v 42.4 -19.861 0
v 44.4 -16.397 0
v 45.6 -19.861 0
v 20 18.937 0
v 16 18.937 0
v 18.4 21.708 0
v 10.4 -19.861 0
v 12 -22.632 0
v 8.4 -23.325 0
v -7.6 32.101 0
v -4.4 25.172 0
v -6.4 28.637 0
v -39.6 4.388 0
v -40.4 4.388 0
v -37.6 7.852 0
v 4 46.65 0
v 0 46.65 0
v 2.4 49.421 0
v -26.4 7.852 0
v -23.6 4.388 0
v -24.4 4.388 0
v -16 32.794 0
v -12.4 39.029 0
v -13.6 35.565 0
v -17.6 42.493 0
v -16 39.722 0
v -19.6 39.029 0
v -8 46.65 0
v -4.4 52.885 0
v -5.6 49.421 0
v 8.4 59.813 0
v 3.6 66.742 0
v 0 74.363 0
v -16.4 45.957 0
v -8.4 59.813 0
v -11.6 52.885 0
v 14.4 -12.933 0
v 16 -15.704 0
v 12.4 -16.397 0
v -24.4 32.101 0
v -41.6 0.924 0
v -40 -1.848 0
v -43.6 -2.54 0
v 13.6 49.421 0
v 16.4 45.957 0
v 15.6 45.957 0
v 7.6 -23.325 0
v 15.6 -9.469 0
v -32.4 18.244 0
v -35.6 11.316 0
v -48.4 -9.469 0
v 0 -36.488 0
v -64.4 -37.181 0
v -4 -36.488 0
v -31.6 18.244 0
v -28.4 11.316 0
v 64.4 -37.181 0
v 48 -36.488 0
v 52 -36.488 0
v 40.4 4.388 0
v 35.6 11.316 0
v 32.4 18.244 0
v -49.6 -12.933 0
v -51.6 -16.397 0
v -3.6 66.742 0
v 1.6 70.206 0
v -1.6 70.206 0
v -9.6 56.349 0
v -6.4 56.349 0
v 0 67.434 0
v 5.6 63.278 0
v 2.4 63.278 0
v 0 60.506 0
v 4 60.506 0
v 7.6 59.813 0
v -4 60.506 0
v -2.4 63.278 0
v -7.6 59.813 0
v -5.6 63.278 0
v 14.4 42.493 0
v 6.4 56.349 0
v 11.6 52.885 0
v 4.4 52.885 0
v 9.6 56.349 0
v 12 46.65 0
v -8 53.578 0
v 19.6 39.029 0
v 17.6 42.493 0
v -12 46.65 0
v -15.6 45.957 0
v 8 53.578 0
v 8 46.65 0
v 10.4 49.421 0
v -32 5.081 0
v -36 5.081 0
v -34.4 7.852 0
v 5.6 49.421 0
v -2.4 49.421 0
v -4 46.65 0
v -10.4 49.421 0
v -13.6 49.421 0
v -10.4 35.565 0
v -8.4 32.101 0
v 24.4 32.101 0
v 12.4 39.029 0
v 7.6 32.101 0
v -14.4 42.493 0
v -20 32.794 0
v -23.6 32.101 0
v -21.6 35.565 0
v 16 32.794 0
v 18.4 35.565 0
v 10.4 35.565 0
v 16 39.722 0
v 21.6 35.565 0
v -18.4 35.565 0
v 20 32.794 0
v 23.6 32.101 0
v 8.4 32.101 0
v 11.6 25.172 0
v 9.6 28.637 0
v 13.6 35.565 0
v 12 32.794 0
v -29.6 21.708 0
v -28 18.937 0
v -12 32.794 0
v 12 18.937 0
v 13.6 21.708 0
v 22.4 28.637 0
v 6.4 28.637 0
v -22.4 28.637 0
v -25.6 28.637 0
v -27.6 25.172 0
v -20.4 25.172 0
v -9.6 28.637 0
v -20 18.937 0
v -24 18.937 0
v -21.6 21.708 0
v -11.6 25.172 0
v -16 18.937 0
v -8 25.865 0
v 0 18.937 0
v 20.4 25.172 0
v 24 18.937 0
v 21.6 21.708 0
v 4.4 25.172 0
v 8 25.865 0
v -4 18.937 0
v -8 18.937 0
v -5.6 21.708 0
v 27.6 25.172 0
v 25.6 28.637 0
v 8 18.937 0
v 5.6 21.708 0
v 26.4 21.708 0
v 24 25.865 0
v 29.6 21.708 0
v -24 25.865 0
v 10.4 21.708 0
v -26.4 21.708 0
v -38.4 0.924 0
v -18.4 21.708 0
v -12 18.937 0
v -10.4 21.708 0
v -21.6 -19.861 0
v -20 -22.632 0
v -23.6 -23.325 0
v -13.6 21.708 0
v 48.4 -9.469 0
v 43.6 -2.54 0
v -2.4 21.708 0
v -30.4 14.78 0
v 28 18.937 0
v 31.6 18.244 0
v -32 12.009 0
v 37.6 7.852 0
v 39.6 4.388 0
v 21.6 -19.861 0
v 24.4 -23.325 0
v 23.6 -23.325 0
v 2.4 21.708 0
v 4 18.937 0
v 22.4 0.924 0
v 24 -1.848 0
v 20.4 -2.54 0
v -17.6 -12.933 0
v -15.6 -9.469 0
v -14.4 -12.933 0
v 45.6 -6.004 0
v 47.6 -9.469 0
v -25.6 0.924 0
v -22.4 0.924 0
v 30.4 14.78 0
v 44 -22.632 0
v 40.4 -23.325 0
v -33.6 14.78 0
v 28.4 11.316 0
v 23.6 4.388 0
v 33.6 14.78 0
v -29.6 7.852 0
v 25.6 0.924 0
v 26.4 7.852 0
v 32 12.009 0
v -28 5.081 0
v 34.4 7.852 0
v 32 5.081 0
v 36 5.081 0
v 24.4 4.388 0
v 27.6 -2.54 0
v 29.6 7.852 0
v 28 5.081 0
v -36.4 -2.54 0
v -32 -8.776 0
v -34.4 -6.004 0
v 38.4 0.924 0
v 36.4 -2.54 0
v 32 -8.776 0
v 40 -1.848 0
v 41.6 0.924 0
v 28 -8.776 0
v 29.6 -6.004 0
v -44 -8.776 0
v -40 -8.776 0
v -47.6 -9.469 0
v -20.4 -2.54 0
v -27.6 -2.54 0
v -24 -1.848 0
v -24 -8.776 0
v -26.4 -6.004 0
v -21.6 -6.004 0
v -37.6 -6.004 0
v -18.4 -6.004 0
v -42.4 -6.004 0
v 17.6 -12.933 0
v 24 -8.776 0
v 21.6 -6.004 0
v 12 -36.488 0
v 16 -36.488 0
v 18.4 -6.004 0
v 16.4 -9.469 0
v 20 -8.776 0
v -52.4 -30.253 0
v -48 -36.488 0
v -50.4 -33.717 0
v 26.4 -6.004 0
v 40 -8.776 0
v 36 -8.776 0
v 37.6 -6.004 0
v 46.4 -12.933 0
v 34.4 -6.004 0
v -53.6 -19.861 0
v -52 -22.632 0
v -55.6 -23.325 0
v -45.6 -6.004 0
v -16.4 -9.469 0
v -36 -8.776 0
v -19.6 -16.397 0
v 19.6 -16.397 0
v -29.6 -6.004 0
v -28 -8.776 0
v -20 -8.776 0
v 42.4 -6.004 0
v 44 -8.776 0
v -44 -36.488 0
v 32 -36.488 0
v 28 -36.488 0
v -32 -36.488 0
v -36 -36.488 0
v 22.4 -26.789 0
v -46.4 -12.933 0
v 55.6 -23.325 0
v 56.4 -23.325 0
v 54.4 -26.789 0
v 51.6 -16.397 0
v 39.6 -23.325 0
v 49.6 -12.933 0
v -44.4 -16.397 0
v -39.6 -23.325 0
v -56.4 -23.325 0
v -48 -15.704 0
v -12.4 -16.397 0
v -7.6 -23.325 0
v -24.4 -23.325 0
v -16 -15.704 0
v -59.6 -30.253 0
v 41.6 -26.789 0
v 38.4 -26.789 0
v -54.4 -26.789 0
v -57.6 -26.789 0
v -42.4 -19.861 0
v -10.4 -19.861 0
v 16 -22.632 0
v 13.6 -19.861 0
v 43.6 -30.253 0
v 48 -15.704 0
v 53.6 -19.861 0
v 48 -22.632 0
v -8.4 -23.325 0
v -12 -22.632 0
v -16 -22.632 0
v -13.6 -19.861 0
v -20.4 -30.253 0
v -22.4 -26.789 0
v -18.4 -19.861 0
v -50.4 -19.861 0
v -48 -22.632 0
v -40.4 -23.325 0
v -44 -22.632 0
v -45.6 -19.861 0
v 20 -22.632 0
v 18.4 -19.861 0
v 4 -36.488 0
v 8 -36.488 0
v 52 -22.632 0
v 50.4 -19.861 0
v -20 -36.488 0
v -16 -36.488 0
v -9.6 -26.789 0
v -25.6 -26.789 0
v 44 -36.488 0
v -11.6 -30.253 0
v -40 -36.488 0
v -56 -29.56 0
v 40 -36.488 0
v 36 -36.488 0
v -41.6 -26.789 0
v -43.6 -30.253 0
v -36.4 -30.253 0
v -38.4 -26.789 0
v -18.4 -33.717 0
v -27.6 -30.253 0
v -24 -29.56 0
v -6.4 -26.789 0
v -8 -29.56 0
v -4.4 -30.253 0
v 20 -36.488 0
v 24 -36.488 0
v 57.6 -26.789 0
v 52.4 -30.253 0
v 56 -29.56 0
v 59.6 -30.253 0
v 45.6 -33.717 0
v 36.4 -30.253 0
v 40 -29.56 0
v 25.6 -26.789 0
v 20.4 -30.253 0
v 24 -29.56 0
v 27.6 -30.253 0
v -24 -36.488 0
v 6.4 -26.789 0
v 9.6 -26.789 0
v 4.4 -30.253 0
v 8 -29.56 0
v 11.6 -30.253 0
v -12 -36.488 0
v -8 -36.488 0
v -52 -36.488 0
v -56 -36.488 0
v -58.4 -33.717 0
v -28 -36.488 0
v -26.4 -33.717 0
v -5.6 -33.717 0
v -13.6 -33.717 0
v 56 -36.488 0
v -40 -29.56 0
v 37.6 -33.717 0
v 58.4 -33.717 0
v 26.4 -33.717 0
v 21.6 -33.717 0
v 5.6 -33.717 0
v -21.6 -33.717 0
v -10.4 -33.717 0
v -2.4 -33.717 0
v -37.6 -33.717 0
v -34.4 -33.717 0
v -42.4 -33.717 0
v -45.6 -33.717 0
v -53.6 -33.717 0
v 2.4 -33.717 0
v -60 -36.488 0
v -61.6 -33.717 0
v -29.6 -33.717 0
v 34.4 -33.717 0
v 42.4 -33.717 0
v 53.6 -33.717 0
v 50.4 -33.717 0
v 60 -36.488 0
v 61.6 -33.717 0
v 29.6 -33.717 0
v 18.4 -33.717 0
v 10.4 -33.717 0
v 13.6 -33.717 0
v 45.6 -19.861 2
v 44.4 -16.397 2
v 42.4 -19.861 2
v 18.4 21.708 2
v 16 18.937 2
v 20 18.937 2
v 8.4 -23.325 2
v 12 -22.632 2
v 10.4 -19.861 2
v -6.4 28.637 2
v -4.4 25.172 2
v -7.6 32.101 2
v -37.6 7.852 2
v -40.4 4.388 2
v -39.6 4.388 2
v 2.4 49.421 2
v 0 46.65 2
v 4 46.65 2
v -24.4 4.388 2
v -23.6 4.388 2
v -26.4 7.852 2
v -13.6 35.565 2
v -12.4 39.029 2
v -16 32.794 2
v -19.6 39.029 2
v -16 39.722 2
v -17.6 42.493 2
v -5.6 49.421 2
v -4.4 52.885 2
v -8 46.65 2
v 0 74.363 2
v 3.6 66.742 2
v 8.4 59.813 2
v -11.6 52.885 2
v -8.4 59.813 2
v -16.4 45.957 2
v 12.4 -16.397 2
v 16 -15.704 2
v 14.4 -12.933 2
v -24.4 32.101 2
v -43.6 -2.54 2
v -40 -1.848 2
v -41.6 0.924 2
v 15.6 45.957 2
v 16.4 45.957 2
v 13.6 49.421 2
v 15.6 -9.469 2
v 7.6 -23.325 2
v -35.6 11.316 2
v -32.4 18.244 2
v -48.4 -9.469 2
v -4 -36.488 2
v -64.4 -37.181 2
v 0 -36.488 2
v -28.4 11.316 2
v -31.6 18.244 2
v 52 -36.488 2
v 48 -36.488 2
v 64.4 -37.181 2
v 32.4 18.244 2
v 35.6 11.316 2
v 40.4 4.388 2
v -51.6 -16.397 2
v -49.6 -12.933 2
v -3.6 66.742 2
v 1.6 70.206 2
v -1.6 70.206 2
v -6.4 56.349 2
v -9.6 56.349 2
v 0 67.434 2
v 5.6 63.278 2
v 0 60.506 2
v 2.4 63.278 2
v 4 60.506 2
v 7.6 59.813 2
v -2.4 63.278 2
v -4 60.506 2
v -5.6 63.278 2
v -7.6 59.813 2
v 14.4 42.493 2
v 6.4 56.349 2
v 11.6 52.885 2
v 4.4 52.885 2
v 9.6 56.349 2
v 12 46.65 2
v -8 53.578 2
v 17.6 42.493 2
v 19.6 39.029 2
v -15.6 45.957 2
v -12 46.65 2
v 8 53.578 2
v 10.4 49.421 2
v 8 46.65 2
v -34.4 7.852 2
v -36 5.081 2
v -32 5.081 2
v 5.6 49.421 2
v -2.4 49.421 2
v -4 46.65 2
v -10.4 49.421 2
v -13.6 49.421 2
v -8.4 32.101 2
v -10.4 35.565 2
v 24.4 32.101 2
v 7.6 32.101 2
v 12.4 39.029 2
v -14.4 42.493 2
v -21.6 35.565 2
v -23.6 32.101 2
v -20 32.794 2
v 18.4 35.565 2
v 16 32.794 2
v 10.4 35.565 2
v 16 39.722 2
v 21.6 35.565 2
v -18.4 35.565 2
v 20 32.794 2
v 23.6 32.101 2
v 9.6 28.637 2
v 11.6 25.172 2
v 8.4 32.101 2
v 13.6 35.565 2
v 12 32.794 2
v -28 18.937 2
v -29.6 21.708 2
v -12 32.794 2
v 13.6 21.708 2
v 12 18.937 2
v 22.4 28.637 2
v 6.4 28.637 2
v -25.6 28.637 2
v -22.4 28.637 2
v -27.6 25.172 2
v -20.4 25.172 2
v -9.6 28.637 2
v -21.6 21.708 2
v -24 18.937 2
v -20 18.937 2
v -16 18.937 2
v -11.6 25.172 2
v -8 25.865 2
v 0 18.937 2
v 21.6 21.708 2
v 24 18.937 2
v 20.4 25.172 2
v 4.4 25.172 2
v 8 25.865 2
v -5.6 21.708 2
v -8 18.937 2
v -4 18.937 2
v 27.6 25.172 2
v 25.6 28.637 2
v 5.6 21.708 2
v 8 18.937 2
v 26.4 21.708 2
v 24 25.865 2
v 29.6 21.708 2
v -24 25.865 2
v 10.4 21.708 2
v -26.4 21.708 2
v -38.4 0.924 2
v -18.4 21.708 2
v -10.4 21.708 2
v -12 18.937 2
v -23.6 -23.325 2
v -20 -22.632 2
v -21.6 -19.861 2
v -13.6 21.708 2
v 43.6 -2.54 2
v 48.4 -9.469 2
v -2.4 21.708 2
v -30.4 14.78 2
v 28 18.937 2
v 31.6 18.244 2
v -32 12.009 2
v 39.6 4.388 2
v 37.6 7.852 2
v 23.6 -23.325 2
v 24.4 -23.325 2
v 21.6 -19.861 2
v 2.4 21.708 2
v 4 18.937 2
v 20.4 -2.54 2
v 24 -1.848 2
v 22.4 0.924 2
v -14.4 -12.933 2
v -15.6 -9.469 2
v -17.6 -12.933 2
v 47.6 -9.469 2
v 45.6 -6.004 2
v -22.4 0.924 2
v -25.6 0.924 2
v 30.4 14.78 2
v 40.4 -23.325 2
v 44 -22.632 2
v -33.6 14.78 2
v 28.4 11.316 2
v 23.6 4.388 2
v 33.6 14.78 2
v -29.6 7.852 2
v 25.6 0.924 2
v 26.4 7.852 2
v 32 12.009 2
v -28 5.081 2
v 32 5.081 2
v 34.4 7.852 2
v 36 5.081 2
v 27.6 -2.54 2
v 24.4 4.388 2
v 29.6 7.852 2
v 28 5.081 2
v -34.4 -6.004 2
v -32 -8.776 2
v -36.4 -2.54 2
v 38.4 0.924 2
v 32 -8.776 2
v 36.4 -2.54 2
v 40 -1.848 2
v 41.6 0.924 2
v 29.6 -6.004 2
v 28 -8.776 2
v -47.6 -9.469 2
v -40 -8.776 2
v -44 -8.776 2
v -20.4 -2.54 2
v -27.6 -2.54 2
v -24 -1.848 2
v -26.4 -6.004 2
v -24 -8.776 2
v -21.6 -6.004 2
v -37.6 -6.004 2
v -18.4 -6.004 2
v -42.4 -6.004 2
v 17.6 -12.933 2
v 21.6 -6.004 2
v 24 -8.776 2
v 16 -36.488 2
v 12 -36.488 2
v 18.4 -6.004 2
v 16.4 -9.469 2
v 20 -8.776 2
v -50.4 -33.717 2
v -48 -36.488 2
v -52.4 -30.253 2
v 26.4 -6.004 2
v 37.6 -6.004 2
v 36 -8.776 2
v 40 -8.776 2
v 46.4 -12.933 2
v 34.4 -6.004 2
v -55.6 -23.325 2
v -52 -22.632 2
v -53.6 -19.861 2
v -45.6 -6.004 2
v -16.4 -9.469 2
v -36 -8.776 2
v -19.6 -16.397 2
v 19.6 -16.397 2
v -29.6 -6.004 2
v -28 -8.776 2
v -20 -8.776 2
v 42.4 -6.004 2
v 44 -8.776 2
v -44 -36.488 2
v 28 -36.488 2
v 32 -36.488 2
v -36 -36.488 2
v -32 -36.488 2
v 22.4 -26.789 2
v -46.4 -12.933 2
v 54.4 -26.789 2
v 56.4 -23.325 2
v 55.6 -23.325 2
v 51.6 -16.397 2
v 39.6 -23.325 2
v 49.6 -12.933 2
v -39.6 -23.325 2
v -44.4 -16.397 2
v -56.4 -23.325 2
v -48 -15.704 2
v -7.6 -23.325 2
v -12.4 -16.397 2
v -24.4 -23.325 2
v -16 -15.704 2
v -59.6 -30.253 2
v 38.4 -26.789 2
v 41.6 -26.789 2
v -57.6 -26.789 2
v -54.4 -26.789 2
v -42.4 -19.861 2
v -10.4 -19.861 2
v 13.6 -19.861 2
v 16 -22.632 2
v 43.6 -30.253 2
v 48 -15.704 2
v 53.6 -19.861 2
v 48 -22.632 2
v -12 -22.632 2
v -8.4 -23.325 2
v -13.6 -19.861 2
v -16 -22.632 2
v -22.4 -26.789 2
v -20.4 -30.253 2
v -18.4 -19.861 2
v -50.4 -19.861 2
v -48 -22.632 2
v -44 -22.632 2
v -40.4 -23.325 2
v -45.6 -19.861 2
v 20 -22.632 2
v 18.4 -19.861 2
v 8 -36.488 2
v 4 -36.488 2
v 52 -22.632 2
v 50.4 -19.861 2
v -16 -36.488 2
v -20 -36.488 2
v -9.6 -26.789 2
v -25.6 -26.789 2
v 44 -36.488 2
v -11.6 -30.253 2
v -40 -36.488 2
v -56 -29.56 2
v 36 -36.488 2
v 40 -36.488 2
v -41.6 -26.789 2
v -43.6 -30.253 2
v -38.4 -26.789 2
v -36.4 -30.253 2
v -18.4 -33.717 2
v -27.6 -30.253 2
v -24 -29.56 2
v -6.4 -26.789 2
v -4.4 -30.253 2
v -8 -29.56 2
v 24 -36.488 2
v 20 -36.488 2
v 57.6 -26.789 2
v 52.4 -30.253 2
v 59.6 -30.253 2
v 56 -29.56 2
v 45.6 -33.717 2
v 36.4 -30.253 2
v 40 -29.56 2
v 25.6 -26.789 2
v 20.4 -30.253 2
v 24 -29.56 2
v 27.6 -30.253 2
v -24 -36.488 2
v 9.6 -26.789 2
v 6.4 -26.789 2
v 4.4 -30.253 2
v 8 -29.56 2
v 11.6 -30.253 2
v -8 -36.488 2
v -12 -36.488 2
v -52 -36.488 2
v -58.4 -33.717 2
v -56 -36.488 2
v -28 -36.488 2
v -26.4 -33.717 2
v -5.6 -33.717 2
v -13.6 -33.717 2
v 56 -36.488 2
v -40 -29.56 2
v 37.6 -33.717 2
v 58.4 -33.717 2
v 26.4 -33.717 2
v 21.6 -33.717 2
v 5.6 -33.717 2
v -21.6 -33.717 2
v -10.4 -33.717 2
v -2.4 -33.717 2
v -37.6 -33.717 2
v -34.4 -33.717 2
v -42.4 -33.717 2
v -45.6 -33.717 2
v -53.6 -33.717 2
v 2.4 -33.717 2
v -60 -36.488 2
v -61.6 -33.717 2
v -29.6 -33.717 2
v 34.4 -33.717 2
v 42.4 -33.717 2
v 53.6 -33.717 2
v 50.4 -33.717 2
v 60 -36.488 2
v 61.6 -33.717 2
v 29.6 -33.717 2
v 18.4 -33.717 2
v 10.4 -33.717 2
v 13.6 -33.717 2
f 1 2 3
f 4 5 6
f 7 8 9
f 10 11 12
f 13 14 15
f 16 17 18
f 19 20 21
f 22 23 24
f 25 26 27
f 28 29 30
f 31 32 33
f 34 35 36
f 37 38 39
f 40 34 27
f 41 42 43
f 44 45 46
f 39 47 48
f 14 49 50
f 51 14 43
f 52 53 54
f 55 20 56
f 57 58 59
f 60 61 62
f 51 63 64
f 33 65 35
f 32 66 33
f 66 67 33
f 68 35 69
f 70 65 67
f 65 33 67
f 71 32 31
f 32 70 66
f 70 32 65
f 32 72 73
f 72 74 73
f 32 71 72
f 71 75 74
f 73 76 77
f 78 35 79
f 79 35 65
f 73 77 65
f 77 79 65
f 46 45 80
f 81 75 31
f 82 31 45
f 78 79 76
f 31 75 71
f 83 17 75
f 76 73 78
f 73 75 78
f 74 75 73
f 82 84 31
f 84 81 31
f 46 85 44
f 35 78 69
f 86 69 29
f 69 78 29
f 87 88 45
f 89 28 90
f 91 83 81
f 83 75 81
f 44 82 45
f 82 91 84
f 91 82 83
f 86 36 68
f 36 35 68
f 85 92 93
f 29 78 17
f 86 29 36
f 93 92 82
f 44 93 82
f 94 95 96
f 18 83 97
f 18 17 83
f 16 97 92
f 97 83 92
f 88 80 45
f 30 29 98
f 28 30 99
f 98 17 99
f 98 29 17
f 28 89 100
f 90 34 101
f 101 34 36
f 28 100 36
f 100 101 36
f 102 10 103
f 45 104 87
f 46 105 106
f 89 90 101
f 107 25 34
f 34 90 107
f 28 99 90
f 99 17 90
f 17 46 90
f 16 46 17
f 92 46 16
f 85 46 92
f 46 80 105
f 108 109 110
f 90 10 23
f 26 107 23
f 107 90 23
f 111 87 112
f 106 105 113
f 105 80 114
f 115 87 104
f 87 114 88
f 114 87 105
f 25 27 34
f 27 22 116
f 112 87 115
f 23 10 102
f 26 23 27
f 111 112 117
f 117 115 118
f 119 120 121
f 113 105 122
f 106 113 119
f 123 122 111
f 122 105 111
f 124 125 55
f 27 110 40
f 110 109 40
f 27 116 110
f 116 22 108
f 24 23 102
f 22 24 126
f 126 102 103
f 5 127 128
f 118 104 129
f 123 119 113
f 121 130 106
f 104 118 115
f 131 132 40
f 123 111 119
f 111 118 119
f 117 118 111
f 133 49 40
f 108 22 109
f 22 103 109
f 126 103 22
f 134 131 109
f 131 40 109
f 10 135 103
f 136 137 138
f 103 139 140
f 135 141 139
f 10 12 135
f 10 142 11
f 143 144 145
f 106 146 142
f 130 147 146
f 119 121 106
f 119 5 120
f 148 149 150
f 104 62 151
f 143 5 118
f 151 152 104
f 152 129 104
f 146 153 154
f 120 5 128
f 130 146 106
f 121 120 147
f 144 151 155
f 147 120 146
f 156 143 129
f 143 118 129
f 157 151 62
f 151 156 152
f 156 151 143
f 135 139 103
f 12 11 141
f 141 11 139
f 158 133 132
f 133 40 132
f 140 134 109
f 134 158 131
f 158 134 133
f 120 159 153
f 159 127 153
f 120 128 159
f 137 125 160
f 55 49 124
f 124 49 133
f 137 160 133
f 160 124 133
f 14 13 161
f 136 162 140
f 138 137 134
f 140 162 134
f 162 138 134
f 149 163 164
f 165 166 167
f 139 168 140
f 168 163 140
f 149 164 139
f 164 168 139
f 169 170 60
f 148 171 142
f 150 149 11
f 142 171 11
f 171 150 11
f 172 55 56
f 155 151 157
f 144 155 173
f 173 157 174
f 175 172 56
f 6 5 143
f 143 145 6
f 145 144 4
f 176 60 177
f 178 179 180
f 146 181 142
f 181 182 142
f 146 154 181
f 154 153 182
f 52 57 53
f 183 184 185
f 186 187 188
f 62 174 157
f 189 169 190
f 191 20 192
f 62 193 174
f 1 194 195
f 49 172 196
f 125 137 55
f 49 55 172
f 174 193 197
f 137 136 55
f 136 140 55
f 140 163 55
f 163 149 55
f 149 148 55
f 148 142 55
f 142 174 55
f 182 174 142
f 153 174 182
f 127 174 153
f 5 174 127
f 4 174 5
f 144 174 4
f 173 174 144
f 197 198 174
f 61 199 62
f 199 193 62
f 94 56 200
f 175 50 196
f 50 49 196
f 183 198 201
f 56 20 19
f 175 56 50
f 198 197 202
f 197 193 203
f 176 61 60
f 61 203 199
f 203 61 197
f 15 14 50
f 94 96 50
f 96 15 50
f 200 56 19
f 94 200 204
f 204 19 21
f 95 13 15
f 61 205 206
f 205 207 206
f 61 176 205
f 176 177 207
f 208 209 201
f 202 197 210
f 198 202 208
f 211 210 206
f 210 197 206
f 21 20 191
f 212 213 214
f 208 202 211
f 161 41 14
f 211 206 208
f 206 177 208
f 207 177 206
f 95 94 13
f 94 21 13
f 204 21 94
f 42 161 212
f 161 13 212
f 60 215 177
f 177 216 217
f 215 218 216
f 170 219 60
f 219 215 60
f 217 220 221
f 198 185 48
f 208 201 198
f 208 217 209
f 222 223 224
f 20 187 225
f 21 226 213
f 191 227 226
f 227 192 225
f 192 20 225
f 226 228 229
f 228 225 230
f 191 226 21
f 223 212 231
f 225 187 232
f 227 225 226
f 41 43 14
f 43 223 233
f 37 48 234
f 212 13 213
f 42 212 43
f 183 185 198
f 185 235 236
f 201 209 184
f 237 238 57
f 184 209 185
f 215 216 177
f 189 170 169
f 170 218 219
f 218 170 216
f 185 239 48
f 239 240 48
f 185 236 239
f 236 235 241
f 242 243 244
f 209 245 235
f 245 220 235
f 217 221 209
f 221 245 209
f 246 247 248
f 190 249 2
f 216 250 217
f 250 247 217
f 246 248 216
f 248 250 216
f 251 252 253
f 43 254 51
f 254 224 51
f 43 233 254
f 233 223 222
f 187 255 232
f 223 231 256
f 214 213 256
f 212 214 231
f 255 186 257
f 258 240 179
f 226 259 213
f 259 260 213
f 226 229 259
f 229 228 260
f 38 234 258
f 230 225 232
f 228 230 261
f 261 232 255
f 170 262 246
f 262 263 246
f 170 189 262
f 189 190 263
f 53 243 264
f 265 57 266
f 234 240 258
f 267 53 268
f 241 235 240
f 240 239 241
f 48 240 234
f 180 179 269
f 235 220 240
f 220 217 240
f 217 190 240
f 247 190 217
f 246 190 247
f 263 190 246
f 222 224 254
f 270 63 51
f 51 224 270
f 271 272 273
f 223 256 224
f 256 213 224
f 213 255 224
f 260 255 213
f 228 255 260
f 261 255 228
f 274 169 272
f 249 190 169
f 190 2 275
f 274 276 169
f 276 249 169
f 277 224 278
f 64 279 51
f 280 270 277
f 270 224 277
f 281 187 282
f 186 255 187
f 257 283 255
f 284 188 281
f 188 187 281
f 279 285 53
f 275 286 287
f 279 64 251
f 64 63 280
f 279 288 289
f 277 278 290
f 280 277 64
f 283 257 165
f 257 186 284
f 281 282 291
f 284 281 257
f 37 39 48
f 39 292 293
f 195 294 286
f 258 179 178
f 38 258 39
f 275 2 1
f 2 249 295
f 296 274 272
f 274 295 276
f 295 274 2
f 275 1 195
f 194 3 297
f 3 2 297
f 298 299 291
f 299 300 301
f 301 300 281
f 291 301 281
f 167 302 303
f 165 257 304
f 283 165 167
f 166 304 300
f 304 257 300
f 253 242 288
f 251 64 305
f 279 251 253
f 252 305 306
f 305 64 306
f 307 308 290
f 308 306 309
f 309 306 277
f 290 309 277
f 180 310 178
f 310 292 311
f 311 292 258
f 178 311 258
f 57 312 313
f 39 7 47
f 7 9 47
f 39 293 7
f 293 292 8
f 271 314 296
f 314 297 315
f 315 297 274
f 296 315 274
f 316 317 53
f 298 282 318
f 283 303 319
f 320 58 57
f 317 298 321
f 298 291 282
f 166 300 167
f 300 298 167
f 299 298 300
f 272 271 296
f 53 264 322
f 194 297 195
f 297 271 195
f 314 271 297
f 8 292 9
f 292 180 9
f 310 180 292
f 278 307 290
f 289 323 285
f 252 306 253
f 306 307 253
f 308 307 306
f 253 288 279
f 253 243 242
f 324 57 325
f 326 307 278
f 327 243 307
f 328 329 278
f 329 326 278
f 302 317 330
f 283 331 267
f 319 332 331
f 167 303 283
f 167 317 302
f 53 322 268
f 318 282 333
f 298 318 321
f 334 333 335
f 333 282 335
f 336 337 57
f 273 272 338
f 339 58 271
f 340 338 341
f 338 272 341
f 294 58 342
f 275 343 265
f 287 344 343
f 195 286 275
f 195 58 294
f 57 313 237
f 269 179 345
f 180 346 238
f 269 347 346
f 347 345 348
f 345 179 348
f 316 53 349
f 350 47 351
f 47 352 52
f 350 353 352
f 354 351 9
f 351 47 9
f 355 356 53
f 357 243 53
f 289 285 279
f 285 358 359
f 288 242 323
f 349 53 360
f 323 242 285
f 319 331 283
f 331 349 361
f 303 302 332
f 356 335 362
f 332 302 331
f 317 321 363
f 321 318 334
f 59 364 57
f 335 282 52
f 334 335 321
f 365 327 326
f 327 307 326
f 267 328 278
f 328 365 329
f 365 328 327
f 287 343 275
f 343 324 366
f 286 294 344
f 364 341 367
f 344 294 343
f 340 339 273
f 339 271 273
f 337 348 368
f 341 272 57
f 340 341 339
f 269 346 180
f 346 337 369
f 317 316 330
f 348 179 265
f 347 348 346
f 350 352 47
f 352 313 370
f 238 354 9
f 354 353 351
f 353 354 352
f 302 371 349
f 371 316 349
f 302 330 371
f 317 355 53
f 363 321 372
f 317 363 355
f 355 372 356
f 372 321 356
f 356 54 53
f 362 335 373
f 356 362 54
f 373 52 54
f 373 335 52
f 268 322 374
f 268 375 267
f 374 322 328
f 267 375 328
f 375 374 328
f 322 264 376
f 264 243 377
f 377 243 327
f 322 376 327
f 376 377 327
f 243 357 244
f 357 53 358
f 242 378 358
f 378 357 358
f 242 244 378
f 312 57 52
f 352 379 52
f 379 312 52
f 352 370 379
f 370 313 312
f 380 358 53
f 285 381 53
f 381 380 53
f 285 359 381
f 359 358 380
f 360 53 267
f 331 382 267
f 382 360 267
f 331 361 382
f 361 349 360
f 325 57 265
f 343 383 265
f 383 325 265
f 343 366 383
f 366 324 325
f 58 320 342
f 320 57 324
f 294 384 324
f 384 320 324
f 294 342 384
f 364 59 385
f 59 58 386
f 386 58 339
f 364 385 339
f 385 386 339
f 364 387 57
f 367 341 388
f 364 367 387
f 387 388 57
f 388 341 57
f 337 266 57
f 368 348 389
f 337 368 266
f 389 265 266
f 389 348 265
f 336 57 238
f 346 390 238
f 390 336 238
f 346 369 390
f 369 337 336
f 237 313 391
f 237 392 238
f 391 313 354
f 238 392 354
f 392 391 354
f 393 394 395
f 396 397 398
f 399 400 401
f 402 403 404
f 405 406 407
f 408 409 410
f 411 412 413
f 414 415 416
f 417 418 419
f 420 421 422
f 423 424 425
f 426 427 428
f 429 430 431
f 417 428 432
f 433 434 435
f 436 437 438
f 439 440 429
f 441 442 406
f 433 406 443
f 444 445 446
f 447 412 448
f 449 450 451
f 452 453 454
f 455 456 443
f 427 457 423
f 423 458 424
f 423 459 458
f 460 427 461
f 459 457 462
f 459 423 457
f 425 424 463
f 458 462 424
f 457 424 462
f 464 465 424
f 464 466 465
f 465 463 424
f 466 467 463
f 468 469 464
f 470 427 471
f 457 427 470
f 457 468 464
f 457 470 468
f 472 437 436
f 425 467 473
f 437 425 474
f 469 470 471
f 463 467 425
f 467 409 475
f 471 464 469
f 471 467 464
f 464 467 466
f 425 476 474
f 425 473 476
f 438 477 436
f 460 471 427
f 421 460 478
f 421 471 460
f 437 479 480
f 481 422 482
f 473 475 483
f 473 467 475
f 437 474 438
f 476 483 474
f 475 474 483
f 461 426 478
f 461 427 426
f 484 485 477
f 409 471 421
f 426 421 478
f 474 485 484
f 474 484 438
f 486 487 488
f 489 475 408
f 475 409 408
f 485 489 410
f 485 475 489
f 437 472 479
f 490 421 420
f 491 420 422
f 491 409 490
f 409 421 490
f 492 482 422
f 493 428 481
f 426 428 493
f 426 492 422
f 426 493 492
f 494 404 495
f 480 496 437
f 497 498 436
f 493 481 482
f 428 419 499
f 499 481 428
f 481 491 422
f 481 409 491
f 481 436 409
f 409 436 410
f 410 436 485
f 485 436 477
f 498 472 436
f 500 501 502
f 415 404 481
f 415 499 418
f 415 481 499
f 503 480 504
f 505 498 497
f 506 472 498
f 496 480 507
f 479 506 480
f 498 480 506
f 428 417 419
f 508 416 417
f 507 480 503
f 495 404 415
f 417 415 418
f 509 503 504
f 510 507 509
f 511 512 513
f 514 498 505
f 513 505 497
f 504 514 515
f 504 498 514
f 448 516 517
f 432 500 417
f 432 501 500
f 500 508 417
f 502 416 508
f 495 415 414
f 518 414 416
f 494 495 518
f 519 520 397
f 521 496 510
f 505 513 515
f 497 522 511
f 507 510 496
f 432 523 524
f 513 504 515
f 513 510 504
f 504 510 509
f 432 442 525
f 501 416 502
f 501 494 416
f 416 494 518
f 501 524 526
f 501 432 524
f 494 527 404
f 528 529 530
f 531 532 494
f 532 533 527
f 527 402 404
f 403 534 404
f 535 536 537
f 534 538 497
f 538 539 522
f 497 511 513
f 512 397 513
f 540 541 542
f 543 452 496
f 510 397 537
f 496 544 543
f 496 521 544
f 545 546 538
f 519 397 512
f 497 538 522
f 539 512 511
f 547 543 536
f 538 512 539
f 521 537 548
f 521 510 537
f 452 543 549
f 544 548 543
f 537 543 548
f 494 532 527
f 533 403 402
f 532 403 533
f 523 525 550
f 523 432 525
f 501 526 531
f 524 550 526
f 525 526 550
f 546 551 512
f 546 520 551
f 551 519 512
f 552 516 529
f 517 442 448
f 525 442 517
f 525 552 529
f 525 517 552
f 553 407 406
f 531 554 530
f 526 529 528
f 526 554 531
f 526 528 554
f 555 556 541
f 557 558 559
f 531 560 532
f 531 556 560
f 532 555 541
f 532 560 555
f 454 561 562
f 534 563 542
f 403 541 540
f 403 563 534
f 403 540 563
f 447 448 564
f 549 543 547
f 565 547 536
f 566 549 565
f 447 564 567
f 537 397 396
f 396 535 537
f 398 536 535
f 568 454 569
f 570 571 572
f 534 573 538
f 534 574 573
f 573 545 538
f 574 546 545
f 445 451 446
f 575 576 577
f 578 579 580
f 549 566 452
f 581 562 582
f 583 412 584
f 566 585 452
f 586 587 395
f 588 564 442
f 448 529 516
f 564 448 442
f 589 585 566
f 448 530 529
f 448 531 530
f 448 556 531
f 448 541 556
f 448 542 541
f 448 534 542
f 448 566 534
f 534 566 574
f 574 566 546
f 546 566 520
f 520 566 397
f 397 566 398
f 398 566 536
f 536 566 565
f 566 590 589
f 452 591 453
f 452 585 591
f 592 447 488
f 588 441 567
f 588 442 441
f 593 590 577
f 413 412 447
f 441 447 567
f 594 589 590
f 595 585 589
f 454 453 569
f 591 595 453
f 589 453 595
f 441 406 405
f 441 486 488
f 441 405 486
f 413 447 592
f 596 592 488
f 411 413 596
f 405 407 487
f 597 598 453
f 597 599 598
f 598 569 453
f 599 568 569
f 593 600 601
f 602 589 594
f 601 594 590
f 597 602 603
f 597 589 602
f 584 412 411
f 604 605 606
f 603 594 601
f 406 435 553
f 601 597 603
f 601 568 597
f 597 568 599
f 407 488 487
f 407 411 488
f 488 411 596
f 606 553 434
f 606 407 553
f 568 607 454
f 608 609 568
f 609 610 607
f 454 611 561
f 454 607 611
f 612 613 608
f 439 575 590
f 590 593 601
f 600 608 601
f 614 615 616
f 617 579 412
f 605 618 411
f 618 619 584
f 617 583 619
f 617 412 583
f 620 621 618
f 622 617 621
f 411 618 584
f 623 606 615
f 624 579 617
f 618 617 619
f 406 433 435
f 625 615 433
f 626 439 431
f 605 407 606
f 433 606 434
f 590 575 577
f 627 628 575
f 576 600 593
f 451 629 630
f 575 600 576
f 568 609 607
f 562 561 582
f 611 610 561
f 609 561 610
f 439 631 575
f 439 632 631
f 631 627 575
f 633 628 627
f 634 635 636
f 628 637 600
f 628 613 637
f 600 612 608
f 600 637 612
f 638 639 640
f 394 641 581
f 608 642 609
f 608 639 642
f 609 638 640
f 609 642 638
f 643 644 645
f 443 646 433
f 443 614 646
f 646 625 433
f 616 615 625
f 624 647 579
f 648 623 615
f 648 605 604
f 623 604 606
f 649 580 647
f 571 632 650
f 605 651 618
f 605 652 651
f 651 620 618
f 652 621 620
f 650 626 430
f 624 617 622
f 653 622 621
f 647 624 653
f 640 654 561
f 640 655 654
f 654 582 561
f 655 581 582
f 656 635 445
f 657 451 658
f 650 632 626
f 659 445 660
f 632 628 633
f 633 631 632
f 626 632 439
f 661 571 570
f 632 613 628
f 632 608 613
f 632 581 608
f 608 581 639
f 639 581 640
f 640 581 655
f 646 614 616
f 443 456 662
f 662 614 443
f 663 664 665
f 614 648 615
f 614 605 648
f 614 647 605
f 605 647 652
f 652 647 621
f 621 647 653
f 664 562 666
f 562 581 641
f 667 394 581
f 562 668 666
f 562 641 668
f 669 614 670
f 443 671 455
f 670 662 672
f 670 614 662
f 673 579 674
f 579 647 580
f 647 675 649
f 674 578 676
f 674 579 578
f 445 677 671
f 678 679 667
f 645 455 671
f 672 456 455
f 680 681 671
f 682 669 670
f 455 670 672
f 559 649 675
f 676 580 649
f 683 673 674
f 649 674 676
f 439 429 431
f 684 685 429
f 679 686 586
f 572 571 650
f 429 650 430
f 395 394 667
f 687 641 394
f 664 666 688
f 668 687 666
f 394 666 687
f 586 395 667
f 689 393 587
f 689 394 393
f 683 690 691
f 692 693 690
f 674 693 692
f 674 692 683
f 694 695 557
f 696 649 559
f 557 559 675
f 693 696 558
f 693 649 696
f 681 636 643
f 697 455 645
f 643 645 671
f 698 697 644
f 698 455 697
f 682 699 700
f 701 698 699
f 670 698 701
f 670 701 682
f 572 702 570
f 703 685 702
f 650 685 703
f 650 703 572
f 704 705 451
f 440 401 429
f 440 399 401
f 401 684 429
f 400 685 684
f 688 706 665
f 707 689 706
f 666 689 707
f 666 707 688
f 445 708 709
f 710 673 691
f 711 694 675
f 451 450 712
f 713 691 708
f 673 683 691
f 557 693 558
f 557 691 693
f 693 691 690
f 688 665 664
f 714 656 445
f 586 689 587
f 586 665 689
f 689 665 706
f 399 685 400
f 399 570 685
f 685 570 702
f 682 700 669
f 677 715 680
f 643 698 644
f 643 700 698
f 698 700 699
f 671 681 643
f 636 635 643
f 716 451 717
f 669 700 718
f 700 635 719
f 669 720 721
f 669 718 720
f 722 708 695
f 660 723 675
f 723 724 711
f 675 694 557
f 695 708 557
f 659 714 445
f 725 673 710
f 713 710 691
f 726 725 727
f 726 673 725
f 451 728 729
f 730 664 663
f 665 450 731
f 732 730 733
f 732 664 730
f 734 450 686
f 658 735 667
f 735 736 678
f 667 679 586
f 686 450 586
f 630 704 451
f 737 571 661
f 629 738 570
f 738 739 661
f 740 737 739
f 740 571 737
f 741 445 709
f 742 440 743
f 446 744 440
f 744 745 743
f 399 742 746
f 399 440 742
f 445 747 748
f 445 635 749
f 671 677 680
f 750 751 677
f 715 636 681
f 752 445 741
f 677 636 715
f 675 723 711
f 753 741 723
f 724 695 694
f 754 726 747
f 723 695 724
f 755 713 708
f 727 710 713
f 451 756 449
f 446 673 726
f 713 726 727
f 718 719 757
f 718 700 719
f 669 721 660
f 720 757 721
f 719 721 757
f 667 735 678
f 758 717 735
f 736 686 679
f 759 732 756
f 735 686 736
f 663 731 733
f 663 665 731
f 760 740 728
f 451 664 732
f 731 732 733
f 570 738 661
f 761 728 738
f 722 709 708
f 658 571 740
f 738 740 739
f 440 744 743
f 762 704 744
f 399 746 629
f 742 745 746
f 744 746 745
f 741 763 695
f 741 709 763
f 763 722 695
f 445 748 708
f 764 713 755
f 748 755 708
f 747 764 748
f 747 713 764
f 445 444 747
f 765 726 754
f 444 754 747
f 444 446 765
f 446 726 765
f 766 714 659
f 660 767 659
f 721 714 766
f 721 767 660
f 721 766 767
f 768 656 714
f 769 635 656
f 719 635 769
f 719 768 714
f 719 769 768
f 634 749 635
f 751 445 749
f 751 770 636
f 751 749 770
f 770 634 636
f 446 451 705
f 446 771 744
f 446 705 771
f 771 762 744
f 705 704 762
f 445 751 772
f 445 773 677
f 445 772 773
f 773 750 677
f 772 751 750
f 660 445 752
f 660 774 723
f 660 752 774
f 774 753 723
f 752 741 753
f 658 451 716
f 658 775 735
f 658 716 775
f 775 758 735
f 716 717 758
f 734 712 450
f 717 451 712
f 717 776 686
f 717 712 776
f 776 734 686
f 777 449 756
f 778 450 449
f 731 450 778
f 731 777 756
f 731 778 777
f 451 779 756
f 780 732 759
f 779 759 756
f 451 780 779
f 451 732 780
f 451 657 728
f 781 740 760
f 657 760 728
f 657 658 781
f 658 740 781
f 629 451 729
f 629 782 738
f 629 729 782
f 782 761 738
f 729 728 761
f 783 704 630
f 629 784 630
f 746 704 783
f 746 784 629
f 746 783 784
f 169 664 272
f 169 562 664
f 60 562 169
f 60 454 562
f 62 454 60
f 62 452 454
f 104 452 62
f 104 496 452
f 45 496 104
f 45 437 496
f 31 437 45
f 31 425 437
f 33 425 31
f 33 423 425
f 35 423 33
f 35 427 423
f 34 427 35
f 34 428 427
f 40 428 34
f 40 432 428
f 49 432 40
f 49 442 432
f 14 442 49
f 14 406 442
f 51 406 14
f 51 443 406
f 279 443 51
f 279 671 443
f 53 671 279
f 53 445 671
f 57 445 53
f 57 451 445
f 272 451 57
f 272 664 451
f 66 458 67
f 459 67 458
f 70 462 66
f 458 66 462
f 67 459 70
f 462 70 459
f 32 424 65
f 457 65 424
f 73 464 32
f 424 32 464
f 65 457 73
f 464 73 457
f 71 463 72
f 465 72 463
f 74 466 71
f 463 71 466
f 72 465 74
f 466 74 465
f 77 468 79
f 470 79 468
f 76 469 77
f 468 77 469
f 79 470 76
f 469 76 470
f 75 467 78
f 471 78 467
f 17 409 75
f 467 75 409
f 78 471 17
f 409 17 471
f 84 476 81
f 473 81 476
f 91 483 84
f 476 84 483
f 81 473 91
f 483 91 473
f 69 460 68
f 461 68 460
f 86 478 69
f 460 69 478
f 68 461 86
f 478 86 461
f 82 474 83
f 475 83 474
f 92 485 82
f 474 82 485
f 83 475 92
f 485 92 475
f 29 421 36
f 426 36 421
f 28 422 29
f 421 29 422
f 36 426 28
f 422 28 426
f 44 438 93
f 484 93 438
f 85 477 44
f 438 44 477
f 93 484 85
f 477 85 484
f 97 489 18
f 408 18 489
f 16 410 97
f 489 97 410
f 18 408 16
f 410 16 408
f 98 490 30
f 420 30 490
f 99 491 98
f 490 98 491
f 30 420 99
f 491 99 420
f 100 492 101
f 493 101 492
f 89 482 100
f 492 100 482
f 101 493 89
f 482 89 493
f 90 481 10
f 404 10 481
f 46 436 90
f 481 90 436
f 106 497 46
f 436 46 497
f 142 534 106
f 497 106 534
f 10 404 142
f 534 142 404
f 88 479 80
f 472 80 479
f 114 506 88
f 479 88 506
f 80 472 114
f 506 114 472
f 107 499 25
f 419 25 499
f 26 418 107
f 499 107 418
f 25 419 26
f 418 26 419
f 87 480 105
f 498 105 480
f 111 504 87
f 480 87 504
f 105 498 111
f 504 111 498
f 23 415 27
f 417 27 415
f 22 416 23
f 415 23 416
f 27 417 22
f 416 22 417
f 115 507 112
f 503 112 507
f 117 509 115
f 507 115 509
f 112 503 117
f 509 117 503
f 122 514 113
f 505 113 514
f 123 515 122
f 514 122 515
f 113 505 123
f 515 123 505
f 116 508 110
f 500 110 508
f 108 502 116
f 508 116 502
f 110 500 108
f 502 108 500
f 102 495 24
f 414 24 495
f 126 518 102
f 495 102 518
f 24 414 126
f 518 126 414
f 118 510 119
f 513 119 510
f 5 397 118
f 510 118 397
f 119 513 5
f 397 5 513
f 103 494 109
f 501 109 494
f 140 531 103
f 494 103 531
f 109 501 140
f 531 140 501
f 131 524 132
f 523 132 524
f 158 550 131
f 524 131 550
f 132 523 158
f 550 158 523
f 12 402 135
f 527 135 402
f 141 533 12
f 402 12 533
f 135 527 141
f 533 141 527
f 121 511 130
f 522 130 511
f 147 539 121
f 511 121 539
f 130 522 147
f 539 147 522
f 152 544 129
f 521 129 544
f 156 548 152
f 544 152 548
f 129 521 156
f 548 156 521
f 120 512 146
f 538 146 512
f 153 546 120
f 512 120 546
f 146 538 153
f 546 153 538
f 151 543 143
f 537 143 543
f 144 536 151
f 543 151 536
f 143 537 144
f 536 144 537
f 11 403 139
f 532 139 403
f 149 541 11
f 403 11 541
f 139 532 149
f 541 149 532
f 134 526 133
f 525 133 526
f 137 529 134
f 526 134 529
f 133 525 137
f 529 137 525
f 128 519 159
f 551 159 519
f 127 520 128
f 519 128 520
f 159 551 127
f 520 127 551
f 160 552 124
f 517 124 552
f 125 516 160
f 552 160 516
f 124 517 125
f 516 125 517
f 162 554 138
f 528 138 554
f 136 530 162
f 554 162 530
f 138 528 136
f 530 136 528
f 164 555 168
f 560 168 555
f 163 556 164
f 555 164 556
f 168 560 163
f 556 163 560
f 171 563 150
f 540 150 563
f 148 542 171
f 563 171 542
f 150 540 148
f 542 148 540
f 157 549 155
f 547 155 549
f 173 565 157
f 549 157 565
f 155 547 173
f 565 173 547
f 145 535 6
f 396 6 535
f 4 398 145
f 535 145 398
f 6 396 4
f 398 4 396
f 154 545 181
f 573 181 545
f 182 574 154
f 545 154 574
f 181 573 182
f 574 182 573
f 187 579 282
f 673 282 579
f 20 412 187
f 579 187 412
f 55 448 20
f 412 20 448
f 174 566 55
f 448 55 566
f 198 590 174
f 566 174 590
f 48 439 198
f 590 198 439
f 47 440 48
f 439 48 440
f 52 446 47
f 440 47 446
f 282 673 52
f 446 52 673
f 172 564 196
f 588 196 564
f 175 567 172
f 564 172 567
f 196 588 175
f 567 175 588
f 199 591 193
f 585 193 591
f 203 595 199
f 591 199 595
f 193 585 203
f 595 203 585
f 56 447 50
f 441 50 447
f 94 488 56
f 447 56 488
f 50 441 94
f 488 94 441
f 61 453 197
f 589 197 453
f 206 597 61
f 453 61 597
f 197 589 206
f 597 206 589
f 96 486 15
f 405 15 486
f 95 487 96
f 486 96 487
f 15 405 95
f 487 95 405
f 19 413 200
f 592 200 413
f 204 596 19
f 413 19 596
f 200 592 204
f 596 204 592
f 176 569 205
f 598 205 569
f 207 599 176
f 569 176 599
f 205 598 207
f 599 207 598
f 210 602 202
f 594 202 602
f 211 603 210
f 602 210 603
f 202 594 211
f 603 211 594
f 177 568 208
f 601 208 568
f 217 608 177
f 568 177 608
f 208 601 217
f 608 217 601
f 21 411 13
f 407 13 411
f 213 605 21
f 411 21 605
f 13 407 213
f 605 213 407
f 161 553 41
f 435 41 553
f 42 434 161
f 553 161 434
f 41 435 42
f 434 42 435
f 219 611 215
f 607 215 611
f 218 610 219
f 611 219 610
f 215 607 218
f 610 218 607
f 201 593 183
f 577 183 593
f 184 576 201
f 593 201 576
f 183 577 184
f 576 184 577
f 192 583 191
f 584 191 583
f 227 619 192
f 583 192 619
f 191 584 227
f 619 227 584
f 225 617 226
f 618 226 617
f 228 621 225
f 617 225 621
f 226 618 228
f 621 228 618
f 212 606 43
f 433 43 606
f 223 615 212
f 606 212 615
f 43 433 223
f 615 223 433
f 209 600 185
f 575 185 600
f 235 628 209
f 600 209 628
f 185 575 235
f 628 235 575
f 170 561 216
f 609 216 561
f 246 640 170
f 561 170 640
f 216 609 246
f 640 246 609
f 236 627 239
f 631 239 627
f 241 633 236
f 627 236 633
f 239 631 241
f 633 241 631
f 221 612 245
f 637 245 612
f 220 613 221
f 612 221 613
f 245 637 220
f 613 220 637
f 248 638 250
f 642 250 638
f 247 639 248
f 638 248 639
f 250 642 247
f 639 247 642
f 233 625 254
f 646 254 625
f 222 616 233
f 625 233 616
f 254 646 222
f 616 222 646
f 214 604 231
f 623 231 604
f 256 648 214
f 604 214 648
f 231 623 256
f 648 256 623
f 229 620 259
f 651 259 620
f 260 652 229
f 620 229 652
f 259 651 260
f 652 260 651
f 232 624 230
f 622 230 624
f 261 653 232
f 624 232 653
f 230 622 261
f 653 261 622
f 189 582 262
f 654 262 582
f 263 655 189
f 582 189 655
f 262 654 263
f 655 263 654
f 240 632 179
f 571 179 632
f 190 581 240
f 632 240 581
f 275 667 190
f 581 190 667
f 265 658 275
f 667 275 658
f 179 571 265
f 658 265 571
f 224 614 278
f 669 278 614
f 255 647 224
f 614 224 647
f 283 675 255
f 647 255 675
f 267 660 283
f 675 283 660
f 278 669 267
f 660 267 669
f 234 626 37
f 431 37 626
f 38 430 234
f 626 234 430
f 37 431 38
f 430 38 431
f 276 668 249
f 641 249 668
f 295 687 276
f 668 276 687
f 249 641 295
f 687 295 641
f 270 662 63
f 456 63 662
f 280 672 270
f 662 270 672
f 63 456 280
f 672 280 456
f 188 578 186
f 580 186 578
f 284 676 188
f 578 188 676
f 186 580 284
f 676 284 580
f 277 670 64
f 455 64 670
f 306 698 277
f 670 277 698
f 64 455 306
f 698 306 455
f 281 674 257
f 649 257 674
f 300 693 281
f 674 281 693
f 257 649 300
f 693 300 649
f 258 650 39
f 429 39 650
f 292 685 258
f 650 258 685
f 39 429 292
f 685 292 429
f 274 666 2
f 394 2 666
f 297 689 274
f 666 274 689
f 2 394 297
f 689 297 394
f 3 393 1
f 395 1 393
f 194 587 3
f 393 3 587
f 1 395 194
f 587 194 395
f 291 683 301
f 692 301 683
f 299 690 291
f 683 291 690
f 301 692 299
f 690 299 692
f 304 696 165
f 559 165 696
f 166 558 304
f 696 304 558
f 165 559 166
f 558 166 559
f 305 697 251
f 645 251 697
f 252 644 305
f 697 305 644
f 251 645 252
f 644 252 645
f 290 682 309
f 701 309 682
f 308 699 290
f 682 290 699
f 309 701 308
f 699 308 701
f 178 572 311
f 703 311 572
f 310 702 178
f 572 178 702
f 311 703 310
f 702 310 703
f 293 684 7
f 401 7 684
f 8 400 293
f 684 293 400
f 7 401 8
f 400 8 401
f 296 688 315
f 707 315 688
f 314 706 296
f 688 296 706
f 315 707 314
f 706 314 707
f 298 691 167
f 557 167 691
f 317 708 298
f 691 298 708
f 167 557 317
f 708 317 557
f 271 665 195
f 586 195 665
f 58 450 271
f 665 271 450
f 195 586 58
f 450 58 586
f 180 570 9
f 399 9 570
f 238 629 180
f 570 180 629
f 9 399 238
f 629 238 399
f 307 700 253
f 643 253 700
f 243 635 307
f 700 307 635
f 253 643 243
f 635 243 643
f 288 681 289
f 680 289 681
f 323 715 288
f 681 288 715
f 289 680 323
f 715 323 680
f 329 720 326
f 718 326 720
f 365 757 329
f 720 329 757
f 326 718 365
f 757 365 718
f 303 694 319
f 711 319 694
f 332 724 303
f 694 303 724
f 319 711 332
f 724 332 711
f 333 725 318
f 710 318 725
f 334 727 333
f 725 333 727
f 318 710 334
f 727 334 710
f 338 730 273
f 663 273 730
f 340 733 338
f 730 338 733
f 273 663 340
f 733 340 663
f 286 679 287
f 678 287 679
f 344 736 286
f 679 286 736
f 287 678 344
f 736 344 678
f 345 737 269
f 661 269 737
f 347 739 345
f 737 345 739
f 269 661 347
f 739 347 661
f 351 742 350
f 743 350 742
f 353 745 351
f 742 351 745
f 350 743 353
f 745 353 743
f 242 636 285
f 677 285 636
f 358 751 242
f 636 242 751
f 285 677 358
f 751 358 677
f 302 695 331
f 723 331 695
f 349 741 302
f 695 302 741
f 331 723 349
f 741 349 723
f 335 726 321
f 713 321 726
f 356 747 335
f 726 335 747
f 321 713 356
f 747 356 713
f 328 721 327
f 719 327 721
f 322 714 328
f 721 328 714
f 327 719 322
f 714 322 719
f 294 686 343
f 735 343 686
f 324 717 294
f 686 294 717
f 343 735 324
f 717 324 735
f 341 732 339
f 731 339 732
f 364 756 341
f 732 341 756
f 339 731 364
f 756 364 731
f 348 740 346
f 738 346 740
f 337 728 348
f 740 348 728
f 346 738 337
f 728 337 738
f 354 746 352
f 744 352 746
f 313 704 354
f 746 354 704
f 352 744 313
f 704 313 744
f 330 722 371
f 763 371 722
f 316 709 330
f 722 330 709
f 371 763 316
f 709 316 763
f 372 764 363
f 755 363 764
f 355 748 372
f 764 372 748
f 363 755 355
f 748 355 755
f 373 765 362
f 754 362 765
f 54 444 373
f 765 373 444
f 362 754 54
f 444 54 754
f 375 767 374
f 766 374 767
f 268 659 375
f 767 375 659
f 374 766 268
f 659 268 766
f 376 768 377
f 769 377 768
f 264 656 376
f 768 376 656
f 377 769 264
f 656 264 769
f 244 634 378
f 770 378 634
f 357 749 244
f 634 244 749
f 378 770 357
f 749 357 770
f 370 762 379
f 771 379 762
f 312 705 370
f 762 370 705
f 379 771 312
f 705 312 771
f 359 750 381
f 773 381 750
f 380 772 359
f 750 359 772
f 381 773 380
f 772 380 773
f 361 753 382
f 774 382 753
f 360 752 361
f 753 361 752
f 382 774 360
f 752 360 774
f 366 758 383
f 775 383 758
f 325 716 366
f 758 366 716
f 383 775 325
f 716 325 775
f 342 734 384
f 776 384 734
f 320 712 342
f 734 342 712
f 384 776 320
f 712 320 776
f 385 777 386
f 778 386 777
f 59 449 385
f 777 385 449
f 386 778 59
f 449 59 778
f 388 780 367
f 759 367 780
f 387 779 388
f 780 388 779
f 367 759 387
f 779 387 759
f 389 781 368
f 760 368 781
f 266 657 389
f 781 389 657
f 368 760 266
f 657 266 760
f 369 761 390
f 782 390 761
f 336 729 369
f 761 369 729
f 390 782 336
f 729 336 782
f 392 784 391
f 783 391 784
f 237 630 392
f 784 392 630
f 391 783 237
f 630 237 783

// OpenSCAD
module triangle(a) {
	t = sqrt(3)*a/3;
	polygon(points=[
		[0, t],
		[cos(30)*t, -sin(30)*t],
		[-cos(30)*t, -sin(30)*t]
	]);
}

module recursion(a) {
	smallest = 4;
	t = sqrt(3)*a/6;
	if (a > smallest) {
		translate([0, t]) recursion(a/2);
		translate([cos(30)*t, -sin(30)*t]) recursion(a/2);
		translate([-cos(30)*t, -sin(30)*t]) recursion(a/2);
	}
	else {
		triangle(smallest * 1.2);
	}
}

linear_extrude(2) recursion(128);
